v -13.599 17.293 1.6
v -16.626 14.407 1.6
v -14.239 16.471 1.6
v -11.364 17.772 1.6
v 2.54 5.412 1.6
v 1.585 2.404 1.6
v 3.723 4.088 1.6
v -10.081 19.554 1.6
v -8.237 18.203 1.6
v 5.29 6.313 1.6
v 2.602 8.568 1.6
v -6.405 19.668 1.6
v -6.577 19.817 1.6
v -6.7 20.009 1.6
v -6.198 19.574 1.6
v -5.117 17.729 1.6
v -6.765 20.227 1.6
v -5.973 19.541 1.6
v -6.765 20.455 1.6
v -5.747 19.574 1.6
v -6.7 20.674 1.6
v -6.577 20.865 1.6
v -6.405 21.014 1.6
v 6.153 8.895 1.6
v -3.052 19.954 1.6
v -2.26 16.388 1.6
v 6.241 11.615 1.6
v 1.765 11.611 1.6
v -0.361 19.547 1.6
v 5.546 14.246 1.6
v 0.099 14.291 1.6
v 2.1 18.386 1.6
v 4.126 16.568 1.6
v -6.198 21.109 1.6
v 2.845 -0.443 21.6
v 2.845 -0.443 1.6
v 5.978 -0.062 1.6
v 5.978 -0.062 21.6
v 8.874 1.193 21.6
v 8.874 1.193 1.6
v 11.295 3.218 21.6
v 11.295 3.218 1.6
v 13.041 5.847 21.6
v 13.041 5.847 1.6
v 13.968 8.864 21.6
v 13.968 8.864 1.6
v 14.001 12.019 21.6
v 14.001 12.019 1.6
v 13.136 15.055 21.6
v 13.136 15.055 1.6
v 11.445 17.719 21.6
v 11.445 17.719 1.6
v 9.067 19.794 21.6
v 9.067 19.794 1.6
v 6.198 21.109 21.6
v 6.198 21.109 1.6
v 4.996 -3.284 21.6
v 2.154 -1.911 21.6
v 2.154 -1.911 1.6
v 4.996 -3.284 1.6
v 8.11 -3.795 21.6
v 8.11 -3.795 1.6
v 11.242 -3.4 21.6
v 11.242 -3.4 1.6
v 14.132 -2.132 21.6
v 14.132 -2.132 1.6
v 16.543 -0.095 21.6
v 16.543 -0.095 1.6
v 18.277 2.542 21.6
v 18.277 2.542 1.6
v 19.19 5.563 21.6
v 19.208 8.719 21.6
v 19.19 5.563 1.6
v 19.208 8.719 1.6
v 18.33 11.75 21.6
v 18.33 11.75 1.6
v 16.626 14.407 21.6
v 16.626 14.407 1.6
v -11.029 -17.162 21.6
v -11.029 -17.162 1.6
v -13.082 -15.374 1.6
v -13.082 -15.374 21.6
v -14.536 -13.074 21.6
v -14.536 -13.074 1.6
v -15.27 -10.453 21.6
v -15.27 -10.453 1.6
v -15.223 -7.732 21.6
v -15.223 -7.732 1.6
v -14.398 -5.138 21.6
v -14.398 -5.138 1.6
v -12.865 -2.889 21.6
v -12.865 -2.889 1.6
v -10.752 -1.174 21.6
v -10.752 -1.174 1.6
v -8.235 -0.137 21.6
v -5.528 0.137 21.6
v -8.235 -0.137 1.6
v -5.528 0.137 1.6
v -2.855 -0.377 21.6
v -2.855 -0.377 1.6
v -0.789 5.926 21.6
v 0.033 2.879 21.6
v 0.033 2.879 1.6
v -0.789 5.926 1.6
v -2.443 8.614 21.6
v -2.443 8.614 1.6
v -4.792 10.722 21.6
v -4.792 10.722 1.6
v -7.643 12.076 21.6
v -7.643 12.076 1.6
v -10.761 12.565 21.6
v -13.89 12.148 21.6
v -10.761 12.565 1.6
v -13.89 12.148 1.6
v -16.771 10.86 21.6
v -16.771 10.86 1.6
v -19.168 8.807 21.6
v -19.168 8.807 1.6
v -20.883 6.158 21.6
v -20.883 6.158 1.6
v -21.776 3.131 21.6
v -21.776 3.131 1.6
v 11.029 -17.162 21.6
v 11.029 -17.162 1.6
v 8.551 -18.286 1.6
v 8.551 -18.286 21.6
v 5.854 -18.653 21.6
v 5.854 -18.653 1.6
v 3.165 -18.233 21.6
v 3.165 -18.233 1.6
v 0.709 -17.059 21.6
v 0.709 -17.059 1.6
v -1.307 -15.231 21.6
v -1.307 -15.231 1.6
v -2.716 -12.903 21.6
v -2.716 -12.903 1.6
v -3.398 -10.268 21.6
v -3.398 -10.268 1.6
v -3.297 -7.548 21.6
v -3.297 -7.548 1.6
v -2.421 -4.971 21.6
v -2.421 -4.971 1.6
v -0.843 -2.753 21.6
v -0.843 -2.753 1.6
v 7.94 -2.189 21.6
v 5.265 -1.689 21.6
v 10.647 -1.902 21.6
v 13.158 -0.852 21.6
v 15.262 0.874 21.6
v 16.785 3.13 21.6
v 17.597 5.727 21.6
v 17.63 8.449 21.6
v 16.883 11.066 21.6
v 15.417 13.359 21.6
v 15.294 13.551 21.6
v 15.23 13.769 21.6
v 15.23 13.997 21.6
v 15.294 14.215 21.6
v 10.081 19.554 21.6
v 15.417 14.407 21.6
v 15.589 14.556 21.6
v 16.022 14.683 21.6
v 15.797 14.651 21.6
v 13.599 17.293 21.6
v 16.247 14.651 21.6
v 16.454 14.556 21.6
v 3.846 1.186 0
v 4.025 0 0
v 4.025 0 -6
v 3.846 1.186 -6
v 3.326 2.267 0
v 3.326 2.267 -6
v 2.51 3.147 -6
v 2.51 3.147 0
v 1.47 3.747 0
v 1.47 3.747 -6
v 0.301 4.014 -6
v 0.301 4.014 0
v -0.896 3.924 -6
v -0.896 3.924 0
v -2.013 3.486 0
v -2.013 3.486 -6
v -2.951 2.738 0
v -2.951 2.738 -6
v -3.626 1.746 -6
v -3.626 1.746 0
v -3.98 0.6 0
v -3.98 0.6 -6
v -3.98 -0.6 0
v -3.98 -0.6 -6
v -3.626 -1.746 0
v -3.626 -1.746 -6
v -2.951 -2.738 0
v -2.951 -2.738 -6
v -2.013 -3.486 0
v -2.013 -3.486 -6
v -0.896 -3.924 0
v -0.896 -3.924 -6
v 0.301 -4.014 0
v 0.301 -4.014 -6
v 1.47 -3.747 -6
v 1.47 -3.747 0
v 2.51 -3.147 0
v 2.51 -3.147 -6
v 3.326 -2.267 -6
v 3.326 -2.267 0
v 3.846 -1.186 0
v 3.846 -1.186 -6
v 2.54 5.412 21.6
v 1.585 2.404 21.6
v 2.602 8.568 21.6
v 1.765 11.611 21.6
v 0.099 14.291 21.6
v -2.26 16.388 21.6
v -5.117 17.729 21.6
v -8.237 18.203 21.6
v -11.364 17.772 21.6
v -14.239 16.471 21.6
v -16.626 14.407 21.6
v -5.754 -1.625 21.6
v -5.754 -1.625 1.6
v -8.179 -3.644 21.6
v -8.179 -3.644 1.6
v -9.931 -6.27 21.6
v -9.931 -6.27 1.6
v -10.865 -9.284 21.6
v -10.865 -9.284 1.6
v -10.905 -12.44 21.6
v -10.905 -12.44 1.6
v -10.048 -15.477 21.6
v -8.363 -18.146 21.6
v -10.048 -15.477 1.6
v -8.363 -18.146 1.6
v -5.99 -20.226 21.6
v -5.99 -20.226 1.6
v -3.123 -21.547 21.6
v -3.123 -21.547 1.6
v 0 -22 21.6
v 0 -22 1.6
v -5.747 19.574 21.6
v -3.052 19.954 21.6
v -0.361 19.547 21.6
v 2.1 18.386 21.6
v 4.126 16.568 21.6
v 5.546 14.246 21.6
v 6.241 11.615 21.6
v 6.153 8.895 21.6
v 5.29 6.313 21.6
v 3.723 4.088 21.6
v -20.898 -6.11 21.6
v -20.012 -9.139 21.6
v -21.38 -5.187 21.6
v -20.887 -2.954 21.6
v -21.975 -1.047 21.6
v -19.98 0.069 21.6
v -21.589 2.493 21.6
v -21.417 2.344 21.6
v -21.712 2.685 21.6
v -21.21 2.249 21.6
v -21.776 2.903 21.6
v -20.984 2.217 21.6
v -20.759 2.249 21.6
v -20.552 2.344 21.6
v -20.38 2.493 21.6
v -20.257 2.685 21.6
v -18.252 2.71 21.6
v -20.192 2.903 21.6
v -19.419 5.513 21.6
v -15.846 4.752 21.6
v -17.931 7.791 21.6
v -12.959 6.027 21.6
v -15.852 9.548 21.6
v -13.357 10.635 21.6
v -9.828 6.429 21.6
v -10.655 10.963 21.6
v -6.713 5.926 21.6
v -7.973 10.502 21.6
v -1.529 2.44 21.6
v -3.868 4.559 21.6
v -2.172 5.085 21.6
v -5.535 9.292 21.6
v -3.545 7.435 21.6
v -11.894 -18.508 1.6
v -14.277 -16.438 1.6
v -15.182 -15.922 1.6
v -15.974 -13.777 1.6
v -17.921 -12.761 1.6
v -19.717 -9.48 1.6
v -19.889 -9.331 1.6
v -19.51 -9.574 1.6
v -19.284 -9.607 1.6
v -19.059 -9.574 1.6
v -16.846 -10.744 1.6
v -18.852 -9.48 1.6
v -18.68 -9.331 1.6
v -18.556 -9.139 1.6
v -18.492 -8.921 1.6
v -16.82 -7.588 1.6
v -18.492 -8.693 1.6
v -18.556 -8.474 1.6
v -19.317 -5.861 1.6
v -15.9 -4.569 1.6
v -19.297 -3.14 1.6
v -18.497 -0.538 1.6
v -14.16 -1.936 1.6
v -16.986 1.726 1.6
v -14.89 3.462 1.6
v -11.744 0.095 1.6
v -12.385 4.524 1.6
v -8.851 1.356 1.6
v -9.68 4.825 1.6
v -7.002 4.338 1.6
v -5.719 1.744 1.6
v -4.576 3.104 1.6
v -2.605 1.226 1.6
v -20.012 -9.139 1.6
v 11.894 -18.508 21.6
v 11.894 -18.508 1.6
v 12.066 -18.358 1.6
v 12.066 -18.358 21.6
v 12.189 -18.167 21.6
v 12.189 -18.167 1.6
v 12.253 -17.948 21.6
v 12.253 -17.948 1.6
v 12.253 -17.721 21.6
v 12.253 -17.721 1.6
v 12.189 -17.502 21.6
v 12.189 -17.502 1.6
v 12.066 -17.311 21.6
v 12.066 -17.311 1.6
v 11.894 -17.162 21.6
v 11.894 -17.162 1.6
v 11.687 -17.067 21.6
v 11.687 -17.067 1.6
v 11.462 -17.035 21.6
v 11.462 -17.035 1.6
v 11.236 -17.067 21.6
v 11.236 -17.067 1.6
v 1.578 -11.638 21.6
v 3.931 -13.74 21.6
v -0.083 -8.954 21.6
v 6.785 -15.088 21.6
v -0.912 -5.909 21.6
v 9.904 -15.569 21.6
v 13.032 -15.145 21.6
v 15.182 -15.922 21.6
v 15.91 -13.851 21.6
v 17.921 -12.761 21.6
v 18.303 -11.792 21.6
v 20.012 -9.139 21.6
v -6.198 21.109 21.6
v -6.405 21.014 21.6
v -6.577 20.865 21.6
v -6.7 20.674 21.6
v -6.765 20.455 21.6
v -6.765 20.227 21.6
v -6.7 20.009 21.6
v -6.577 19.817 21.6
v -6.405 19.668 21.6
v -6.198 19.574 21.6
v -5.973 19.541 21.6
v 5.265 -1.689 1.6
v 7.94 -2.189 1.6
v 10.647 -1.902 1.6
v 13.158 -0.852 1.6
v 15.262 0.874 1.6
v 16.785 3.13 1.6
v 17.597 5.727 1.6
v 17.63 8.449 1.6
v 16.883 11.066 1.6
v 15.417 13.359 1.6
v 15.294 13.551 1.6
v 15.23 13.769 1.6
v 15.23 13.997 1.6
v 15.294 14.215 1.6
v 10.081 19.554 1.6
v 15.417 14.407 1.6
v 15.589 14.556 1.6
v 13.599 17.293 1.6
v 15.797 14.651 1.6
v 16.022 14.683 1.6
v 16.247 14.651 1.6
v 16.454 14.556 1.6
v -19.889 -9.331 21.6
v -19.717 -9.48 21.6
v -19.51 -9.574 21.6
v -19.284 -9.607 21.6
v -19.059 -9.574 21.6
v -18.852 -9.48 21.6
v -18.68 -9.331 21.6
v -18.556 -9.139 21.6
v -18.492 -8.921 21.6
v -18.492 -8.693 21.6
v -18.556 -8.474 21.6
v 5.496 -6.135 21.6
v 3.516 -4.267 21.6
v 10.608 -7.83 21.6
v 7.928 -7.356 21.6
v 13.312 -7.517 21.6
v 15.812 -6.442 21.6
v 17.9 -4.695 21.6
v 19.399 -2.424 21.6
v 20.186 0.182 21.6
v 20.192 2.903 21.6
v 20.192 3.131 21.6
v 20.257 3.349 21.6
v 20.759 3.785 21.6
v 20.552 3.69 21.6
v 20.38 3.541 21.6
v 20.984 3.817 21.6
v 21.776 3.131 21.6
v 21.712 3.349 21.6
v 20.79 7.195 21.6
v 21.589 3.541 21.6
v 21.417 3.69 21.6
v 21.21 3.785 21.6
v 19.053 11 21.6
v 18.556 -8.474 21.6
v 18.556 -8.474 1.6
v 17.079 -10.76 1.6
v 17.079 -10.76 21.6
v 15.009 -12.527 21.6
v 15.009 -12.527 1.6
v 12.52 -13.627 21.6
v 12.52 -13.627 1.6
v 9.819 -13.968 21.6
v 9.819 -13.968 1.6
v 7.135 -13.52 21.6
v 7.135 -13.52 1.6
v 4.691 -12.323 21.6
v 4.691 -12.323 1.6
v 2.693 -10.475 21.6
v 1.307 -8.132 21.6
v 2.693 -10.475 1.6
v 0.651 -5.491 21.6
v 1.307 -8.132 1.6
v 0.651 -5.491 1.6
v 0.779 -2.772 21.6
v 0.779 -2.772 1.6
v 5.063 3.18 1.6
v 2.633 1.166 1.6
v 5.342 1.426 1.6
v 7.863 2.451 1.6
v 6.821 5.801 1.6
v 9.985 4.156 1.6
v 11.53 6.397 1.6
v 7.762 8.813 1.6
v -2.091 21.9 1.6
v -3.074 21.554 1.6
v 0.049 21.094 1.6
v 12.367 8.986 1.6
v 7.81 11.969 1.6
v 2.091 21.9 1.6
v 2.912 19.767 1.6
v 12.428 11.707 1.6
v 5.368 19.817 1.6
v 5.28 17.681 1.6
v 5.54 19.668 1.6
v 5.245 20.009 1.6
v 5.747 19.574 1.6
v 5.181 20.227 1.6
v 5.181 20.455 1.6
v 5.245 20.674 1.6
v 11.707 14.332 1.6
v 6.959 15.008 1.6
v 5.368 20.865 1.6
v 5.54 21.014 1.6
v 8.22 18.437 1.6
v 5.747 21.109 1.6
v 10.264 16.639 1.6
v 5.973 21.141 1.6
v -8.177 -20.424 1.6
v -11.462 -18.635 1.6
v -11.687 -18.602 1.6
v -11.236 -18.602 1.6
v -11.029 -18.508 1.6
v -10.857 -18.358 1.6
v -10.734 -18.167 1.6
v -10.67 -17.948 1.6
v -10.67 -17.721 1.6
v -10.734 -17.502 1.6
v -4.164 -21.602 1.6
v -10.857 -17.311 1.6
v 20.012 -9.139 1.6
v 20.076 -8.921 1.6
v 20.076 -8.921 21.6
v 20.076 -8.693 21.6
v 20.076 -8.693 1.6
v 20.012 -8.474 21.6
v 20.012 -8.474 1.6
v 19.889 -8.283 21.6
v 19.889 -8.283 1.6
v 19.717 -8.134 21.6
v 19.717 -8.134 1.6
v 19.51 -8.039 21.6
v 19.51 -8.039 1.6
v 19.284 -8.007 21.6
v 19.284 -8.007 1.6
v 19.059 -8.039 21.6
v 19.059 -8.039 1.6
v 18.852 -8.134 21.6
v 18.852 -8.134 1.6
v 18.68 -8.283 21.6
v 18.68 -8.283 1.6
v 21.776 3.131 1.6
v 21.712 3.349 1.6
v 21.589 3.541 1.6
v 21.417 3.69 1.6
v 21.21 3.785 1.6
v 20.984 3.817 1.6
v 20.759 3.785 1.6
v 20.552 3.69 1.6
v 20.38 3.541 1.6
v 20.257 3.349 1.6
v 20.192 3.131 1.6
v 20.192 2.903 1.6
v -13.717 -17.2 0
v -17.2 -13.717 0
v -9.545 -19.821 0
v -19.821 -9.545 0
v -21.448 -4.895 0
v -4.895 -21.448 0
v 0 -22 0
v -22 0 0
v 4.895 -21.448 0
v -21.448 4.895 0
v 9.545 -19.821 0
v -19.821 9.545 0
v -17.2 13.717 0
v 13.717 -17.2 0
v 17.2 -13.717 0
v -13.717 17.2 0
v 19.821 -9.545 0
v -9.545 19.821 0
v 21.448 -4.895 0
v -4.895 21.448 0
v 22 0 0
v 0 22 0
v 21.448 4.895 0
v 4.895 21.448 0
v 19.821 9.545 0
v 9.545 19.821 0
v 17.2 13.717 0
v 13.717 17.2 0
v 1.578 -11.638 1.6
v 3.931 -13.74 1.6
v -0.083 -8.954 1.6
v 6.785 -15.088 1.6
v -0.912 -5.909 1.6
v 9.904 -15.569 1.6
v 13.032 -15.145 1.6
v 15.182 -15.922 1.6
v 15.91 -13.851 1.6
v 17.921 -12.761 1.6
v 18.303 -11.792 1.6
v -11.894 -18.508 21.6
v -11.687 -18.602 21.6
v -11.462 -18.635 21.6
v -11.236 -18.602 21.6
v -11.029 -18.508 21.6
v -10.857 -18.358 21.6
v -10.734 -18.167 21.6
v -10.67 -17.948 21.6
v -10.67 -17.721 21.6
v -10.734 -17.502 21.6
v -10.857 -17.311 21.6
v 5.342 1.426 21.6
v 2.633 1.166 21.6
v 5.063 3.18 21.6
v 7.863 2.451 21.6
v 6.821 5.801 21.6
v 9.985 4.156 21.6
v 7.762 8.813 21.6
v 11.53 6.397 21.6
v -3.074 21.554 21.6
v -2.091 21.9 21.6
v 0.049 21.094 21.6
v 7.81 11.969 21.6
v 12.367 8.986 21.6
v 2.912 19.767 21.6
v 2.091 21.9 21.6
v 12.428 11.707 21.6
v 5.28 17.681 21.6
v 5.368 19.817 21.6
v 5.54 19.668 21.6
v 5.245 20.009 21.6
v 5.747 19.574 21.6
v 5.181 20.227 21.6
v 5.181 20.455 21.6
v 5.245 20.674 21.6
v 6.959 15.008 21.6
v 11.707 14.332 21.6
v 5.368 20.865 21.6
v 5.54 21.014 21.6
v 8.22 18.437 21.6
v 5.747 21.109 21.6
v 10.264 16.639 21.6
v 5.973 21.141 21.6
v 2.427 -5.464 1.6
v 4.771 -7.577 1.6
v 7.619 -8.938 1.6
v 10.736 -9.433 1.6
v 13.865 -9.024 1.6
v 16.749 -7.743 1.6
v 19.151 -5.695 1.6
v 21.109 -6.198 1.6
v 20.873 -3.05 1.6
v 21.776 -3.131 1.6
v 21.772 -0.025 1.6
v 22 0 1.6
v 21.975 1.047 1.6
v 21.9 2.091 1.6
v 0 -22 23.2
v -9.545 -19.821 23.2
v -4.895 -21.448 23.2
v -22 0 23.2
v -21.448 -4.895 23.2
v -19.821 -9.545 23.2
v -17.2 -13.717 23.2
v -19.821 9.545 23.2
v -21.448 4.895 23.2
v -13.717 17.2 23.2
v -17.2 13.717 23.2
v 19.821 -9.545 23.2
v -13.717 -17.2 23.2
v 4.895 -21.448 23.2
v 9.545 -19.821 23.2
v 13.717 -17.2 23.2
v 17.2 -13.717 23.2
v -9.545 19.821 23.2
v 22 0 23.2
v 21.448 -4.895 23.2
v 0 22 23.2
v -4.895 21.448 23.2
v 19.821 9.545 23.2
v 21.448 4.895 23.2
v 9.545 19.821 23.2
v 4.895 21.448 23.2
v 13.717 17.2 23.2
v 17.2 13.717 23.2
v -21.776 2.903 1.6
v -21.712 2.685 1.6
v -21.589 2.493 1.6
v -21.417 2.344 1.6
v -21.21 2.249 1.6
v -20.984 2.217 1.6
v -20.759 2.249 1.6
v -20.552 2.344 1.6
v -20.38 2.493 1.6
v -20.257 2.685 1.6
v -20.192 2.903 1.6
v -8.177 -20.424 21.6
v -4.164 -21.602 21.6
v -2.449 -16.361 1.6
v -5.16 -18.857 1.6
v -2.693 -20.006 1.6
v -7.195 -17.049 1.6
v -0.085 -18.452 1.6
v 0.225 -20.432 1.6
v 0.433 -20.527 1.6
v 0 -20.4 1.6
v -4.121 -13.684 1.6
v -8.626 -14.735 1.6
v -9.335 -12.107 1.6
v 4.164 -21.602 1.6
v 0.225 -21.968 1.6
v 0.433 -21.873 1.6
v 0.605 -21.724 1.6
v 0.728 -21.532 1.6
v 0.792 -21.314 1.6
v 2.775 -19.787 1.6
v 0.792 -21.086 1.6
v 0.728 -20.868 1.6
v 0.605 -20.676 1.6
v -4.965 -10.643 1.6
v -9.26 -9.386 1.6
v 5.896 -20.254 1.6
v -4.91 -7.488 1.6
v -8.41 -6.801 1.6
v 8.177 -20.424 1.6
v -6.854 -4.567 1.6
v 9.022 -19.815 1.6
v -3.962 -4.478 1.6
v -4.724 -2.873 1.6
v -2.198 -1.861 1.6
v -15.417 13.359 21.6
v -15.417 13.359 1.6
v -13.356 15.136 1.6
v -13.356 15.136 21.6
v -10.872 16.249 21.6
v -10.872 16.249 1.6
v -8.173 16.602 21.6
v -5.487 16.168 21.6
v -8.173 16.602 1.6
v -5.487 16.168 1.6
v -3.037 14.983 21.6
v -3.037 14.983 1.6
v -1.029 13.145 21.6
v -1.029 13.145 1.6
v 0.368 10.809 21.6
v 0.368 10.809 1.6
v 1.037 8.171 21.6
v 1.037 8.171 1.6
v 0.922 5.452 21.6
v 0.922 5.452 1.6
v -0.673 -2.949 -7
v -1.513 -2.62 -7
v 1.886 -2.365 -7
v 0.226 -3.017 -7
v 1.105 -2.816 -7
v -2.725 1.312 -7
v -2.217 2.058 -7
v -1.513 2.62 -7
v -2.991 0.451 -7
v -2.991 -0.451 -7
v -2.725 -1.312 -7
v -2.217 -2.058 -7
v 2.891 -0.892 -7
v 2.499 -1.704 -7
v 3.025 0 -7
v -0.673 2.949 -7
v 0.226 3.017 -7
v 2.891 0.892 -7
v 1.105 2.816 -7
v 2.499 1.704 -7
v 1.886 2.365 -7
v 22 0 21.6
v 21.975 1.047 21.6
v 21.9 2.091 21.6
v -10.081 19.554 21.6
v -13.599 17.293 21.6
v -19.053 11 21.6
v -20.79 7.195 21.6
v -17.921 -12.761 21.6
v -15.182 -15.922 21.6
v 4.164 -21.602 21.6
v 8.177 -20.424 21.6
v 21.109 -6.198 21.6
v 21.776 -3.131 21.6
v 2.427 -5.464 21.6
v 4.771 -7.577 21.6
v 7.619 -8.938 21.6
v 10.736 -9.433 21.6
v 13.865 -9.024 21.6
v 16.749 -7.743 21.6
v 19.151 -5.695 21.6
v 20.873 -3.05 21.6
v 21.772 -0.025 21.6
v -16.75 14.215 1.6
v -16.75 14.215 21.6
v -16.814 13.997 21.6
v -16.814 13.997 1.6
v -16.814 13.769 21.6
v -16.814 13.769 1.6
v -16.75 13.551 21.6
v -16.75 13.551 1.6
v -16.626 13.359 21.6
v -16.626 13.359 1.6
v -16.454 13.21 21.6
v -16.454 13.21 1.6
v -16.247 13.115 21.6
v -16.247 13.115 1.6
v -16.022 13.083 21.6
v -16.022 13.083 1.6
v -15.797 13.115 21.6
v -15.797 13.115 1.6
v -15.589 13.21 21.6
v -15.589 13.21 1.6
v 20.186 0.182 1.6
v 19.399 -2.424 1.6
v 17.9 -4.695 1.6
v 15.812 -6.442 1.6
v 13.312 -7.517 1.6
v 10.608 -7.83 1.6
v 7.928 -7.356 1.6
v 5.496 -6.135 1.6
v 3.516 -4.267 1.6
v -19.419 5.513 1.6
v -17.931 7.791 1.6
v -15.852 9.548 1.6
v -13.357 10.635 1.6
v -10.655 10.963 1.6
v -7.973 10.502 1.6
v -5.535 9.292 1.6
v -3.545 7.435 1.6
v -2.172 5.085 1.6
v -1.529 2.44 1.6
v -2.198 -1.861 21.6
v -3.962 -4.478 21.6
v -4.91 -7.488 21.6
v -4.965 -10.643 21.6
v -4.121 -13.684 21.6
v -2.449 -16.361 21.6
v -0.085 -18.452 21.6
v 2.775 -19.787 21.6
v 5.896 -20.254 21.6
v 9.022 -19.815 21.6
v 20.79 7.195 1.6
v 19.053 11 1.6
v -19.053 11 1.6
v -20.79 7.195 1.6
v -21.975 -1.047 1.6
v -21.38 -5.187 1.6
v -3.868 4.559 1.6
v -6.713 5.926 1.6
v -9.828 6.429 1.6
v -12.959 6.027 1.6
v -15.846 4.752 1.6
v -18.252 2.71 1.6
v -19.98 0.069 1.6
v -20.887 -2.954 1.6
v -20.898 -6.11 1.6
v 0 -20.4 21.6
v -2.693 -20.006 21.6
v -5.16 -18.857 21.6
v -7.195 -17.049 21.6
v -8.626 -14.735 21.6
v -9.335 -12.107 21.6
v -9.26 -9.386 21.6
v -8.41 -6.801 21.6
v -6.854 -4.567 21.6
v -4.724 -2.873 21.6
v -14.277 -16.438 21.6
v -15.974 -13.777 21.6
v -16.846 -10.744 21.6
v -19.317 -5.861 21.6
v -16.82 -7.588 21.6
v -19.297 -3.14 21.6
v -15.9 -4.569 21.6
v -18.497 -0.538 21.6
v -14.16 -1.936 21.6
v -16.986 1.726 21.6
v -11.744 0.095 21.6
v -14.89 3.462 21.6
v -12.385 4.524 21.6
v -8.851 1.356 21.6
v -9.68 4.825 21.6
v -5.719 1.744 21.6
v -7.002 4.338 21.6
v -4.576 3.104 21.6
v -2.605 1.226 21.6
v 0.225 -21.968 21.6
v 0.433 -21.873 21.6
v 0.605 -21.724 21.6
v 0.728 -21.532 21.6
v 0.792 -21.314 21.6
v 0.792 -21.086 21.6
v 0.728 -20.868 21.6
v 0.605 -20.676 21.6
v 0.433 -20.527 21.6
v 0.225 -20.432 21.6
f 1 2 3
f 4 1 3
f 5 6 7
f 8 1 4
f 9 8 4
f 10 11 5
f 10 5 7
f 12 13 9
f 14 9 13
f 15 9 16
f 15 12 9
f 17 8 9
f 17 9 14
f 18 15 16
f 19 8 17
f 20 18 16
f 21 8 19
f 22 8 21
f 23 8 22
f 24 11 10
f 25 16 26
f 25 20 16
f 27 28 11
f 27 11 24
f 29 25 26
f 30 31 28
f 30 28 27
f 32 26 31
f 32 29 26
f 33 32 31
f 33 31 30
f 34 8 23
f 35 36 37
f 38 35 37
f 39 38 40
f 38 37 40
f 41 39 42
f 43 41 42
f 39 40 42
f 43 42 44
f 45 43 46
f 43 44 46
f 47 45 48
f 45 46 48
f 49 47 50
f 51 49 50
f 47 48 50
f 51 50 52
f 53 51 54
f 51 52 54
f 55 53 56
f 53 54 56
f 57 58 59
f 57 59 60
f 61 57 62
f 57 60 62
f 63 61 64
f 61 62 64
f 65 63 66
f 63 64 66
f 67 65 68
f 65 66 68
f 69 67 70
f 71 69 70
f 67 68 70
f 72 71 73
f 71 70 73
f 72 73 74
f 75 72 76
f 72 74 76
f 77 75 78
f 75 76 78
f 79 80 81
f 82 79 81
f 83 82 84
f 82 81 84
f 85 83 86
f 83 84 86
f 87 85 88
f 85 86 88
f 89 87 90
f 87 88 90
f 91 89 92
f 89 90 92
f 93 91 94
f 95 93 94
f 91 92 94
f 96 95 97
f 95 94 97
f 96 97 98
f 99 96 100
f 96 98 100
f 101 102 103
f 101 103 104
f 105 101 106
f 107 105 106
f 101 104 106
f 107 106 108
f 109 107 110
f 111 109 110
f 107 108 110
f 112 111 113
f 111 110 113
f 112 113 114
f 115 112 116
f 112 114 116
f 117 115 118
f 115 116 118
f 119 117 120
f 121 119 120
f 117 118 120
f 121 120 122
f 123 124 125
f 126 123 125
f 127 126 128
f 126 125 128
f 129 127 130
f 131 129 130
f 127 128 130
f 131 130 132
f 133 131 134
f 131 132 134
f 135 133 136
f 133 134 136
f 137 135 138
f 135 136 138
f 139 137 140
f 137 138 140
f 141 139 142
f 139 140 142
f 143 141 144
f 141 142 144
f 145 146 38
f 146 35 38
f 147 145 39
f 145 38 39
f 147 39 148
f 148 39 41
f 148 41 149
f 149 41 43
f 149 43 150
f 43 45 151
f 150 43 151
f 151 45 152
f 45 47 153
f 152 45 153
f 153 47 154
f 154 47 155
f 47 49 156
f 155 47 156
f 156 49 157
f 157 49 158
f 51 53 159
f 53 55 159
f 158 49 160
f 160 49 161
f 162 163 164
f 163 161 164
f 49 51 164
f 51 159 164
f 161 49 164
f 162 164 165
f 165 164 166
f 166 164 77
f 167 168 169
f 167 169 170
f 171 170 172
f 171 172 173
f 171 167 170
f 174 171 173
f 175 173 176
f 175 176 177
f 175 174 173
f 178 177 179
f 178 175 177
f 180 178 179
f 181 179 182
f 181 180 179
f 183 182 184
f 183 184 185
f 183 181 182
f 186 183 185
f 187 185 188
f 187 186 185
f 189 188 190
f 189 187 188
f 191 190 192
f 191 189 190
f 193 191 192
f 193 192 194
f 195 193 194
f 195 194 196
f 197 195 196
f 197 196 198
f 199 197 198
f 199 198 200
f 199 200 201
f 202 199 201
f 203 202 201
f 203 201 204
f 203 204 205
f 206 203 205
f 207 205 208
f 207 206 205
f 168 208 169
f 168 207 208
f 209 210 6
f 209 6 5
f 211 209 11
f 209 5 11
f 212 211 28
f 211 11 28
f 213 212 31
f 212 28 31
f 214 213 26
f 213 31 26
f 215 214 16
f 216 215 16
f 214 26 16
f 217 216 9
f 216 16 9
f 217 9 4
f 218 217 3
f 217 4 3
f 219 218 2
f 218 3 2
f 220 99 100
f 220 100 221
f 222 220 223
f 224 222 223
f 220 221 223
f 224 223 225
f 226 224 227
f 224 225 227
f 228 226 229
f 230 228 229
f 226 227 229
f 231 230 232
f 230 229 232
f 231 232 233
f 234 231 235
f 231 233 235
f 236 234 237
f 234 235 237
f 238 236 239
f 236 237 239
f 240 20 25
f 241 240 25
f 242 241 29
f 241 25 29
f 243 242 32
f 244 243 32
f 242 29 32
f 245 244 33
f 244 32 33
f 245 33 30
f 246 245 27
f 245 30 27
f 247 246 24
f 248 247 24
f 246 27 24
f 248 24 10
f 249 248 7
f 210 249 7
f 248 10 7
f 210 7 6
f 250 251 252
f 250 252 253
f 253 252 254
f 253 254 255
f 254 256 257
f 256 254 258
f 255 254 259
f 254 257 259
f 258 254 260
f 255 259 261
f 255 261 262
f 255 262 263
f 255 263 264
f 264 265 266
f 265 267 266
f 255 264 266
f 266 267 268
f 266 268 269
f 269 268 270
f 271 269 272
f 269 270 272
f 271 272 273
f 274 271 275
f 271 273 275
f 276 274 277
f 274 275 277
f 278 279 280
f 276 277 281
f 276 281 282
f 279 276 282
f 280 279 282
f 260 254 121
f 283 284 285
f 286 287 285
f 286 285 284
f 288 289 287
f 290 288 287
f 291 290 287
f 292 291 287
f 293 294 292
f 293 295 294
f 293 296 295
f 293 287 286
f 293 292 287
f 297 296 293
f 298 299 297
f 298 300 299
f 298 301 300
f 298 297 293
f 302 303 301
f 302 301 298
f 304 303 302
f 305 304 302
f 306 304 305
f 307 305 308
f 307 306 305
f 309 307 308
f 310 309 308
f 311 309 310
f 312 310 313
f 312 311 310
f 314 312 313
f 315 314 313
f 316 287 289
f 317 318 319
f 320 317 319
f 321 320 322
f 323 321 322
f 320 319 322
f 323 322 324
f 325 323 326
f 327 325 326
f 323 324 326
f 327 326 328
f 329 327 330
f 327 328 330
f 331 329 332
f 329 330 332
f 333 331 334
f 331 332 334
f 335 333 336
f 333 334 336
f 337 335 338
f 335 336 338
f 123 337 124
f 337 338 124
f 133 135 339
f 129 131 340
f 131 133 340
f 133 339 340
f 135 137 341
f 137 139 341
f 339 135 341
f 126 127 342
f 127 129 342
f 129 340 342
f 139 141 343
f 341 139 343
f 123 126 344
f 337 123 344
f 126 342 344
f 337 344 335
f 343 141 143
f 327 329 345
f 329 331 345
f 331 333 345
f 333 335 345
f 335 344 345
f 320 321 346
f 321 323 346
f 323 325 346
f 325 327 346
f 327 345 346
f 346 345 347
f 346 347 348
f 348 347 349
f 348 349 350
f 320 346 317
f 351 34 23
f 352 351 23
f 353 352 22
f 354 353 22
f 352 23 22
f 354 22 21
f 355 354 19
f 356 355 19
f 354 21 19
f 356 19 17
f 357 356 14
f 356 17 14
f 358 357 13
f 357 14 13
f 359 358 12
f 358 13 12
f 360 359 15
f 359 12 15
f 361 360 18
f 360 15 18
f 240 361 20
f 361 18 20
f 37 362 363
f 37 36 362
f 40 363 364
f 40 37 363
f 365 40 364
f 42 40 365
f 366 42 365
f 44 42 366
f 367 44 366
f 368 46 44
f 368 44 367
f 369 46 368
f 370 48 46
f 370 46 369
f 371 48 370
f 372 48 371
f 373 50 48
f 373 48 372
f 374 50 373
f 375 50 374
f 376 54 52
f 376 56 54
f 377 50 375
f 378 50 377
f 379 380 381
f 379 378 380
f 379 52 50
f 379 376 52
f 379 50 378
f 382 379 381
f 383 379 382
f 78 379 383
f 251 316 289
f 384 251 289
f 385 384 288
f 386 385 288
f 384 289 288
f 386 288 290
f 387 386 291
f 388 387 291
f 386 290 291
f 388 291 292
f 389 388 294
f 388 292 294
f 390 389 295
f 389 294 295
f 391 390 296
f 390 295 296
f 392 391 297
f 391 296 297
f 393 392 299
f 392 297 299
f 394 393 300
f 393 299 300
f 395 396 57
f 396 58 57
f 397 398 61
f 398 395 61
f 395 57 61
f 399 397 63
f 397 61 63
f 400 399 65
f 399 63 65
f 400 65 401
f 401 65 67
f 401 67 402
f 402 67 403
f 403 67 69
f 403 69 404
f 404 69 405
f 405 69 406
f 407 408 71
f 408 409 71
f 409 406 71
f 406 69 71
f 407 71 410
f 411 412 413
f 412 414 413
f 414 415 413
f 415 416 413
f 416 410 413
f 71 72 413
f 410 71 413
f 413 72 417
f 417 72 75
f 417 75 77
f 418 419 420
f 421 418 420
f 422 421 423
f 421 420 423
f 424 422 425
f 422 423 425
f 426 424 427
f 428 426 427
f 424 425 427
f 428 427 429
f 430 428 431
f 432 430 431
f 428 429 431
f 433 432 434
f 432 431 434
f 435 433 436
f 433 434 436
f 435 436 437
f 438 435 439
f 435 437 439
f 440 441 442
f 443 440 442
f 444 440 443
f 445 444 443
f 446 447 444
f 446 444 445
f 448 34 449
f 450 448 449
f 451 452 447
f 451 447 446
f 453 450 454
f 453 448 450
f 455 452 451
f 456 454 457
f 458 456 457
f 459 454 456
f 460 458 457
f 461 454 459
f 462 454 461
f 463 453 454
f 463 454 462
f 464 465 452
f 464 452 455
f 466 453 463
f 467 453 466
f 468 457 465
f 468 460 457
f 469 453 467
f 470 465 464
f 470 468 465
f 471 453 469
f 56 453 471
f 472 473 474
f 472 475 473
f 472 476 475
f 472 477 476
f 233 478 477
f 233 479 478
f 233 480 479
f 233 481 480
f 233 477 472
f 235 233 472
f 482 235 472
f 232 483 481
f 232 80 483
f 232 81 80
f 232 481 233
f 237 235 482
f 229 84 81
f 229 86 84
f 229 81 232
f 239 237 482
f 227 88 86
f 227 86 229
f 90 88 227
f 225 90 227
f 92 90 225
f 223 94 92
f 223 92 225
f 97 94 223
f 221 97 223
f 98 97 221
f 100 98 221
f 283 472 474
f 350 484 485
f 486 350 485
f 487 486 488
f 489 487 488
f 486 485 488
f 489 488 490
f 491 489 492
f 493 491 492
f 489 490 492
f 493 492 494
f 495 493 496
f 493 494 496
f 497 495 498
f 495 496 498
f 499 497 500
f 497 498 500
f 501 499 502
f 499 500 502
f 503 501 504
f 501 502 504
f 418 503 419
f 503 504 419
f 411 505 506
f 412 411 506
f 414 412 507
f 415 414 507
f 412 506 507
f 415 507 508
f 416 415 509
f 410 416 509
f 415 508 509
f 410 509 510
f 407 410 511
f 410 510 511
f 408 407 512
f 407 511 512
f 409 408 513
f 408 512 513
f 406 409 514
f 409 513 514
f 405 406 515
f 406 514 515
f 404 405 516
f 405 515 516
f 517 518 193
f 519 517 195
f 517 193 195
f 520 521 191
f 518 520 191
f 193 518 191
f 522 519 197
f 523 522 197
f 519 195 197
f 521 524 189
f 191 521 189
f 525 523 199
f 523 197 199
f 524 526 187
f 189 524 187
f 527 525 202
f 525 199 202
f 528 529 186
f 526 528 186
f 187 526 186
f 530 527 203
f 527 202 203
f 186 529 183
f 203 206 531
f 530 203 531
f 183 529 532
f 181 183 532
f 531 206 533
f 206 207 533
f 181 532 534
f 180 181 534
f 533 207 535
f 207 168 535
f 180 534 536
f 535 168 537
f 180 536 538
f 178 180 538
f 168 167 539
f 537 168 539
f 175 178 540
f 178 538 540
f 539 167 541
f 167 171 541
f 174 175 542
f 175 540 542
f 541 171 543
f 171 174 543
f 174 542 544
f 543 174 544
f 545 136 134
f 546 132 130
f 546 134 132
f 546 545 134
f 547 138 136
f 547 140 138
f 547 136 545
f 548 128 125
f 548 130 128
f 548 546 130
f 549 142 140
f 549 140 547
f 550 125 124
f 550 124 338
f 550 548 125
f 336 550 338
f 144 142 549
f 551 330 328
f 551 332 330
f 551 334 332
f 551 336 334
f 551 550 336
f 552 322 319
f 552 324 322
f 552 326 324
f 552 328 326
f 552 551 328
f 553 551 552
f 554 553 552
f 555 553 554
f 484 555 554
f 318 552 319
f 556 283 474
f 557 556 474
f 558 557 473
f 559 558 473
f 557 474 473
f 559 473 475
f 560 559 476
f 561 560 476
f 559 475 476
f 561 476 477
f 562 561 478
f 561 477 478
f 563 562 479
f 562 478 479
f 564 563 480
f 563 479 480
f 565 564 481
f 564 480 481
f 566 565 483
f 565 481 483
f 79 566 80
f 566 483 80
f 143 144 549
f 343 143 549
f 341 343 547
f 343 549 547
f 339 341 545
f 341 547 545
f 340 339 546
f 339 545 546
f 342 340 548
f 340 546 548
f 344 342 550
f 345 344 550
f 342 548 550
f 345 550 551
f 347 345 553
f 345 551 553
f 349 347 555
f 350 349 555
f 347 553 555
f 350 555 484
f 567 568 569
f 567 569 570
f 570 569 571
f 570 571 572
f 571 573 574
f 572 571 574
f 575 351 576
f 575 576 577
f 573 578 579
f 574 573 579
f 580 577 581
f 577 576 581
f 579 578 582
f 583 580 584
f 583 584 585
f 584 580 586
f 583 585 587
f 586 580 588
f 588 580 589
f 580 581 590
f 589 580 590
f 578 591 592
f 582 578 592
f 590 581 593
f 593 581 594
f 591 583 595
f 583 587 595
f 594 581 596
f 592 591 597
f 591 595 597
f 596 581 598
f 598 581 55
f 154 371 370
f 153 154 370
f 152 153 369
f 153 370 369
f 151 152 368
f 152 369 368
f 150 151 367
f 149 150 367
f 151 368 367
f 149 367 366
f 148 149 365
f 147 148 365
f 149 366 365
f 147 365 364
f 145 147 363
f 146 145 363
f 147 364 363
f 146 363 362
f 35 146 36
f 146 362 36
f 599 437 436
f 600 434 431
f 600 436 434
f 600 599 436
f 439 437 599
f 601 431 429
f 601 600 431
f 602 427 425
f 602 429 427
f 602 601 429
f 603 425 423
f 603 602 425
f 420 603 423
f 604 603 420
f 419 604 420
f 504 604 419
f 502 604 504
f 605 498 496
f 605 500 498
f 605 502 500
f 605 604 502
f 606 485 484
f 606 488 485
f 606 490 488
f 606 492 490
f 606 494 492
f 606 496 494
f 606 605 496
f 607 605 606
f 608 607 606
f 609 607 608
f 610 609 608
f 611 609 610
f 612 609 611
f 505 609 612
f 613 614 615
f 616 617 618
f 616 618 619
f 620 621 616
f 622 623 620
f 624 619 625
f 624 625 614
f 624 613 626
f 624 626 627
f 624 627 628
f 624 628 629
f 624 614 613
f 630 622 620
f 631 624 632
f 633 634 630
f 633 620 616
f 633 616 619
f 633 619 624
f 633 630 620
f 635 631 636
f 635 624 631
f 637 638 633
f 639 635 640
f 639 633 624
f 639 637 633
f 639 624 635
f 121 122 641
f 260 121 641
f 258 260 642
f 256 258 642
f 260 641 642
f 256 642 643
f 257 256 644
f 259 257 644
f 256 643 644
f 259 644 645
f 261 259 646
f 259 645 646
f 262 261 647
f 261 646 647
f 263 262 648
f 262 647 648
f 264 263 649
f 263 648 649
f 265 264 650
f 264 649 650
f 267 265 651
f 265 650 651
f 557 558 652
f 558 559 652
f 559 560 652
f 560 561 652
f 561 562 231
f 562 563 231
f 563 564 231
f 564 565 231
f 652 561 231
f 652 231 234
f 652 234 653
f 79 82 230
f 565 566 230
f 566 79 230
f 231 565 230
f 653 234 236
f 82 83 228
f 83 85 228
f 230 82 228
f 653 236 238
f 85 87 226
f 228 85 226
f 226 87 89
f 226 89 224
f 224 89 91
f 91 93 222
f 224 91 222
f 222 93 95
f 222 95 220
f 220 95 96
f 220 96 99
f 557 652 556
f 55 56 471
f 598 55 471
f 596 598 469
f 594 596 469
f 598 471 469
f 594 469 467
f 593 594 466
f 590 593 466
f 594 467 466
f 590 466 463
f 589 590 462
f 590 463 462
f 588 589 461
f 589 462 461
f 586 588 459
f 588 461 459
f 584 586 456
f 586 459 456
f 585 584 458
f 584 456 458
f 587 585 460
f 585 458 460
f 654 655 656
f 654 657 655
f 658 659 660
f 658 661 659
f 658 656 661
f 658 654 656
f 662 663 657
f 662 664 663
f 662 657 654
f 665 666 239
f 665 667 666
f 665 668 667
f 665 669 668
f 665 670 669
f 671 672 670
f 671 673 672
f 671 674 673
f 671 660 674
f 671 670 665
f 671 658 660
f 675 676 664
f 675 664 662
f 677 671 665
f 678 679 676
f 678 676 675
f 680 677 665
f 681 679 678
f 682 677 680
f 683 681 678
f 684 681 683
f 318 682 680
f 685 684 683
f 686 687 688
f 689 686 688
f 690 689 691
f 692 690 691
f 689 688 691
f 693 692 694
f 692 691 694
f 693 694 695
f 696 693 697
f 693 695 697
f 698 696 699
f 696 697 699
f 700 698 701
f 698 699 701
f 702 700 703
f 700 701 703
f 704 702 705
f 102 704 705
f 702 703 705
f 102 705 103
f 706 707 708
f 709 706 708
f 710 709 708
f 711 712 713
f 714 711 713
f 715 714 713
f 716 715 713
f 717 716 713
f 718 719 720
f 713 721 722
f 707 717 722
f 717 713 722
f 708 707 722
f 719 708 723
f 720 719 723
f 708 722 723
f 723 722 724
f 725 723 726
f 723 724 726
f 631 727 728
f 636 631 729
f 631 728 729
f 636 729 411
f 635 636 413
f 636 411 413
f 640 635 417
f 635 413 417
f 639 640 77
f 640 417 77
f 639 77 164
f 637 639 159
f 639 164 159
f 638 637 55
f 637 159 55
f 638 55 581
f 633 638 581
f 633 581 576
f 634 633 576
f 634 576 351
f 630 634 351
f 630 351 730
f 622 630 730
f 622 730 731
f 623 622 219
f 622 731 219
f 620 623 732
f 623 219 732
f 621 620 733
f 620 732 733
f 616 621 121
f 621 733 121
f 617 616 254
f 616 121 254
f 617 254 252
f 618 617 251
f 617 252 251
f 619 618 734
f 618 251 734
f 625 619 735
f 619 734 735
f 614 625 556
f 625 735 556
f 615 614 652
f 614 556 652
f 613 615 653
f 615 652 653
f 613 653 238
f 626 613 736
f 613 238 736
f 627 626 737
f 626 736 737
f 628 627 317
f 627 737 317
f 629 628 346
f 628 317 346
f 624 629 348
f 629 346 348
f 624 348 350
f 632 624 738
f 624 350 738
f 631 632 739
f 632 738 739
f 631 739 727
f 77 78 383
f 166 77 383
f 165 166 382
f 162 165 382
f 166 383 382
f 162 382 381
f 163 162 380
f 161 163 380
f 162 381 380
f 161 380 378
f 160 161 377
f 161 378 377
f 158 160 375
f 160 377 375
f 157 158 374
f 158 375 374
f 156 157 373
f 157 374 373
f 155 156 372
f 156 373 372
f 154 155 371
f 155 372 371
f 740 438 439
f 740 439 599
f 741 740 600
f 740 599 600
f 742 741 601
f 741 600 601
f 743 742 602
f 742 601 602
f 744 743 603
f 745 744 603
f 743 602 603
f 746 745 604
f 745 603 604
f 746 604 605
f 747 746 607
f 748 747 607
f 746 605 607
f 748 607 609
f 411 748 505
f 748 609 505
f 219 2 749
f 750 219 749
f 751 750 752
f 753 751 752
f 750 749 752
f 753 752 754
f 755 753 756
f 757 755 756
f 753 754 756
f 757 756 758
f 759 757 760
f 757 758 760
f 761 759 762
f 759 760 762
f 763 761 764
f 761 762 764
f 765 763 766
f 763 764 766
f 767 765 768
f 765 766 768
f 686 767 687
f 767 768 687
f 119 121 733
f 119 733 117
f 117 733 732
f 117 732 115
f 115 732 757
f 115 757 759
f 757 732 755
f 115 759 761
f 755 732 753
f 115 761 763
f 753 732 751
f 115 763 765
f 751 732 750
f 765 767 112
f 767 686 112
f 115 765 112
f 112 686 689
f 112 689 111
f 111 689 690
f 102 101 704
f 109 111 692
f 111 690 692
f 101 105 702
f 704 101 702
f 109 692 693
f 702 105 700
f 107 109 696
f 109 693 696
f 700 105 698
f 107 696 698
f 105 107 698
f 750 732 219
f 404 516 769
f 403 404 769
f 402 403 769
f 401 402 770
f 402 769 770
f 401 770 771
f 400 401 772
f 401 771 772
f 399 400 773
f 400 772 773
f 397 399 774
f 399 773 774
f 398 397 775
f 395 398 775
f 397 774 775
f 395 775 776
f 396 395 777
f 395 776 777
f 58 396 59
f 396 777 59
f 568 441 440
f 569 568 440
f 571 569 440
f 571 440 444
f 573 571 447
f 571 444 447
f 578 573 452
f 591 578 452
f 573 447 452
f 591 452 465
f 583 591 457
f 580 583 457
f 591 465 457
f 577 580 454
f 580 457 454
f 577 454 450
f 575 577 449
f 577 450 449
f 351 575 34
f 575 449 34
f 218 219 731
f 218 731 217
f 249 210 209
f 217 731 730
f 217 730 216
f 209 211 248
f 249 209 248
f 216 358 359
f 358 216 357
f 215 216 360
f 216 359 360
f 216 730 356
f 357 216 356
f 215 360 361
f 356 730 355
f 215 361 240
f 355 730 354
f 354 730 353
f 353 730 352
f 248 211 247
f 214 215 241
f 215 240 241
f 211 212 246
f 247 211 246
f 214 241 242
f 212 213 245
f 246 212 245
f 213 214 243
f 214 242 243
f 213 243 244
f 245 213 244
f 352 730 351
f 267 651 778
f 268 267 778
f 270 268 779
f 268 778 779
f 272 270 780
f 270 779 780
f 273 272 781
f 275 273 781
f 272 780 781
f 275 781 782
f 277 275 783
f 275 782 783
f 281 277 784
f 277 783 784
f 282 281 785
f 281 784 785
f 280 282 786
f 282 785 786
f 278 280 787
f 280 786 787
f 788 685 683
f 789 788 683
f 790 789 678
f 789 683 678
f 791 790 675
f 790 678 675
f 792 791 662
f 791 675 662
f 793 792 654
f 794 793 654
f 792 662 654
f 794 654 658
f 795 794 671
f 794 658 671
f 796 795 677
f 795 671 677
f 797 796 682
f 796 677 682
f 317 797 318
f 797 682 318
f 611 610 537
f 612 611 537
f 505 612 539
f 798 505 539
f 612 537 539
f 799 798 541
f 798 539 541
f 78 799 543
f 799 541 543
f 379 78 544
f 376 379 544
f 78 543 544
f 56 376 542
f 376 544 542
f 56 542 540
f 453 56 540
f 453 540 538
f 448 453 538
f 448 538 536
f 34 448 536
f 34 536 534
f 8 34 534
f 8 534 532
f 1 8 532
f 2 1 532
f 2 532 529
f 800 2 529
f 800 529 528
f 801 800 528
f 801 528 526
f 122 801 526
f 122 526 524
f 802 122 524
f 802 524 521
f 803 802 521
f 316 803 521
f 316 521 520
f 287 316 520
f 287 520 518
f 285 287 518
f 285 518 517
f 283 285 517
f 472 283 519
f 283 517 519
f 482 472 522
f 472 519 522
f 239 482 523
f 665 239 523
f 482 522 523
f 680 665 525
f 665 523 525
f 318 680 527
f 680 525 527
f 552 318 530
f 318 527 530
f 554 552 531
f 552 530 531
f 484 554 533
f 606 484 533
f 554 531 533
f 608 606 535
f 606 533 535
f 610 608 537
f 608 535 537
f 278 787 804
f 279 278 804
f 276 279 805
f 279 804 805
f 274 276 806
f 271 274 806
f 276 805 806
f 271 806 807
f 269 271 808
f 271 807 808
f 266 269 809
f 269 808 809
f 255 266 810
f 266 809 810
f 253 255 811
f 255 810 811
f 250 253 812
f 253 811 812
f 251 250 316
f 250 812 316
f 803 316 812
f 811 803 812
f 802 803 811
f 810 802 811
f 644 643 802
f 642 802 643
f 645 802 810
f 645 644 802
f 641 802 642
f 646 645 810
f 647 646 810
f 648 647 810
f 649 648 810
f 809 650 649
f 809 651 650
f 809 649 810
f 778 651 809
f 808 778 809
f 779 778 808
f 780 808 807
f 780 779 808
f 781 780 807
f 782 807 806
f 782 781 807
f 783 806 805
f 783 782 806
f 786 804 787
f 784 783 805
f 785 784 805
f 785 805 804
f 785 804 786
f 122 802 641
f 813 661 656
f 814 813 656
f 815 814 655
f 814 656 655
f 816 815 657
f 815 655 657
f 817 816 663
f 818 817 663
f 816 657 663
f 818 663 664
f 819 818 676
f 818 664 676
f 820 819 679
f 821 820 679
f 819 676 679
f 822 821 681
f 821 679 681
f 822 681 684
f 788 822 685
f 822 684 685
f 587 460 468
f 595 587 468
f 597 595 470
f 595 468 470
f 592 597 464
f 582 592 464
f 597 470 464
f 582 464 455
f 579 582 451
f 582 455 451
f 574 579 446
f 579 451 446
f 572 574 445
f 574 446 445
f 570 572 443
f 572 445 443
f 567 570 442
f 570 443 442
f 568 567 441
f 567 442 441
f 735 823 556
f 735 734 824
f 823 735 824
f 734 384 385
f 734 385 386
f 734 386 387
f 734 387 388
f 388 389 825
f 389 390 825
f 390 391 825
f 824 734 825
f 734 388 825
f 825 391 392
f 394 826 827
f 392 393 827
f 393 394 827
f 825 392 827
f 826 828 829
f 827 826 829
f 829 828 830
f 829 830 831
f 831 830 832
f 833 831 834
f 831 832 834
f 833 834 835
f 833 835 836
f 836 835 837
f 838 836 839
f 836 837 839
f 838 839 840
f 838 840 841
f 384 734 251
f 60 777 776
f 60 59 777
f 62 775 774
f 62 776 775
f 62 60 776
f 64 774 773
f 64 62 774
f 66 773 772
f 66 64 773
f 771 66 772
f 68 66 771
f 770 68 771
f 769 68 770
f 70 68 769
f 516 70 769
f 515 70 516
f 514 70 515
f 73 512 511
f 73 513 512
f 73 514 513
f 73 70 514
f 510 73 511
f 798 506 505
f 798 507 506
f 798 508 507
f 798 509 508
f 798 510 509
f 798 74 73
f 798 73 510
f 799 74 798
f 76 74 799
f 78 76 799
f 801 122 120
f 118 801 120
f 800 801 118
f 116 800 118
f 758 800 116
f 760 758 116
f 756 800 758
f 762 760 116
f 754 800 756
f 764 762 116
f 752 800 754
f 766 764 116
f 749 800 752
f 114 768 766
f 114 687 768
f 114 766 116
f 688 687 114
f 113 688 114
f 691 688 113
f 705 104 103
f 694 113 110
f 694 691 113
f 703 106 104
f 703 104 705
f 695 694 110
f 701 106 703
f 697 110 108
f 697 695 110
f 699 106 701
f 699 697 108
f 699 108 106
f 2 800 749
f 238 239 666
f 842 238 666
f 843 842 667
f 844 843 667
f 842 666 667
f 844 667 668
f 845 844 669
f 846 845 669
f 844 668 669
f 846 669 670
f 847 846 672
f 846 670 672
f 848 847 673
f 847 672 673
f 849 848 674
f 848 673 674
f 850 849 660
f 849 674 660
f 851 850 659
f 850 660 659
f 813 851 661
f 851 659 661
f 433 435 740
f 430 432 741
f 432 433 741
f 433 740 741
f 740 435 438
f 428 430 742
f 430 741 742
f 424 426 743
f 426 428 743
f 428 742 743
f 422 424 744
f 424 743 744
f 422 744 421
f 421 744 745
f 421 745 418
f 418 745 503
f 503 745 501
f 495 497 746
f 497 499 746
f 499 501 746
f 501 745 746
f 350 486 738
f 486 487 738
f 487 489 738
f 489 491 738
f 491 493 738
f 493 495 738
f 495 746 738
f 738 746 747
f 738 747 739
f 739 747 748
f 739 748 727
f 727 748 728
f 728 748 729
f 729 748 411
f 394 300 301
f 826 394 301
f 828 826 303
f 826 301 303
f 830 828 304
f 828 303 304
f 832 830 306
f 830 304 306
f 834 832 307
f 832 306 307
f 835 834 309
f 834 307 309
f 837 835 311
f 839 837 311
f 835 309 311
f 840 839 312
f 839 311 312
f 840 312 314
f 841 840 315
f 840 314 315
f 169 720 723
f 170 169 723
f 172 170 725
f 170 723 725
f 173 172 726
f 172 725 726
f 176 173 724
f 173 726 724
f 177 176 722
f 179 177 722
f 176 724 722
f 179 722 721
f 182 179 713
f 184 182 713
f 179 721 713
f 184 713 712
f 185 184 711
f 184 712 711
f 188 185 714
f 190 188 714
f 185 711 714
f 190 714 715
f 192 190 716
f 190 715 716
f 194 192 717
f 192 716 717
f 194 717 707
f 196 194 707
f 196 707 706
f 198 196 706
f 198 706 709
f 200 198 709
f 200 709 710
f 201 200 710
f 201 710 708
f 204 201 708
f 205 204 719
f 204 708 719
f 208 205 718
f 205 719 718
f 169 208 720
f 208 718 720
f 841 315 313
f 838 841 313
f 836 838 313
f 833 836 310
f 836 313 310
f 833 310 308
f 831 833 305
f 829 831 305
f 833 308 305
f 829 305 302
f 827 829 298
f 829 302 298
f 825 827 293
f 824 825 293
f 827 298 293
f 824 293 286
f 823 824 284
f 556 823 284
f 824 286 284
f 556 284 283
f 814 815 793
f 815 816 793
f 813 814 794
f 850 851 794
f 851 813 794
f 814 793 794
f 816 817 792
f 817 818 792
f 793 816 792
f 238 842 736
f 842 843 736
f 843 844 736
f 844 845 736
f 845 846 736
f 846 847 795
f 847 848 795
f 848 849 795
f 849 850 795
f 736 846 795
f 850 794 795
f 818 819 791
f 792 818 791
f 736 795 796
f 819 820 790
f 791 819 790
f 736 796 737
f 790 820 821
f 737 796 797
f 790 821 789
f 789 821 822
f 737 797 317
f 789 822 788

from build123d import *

# Parameters (mm, degrees)
F4_R      = 22
F4_R_2    = 4.025
F5_DEPTH  = 1.6
F6_DEPTH  = 7
F8_SIZE   = 1
F9_DEPTH  = 20
F10_COUNT = 11
F11_START = 21.6
F11_DEPTH = 1.6


with BuildPart() as f5:
    # F4 (on Top) → F5 (new body)
    with BuildSketch(Plane.XY):
        Circle(F4_R)
        Circle(F4_R_2, mode=Mode.SUBTRACT)
        Circle(F4_R_2)
    extrude(amount=F5_DEPTH)

    # F4 (on Top) → F6 (join)
    with BuildSketch(Plane.XY):
        Circle(F4_R_2)
    extrude(amount=-F6_DEPTH)

    # F8
    f8_edges = [f5.edges().sort_by_distance(p)[0] for p in [
        (-4.025, 0, -7),
    ]]
    chamfer(f8_edges, length=F8_SIZE)



with BuildPart() as f9:
    # F7 (on face) → F9 (new body)
    with BuildSketch(Plane.XY.offset(1.6)):
        with BuildLine():
            ThreePointArc((0, -1.6), (0.8, -0.8), (0, 0))
            ThreePointArc((0, 0), (-11, -11), (0, -22))
            ThreePointArc((0, -22), (0.8, -21.2), (0, -20.4))
            ThreePointArc((0, -20.4), (-9.4, -11), (0, -1.6))
        make_face()
    extrude(amount=F9_DEPTH)


with BuildPart() as f5_1:
    add(f5.part)

    add(f9.part)  # F10 merges F9
    # F10: F9 ×11 about axis
    f10_axis = Axis((0, 0, 0), (0, 0, 1))
    for i in range(1, F10_COUNT):
        add(f9.part.rotate(f10_axis, i * 360 / F10_COUNT))

    # F4 (on Top) → F11 (join)
    with BuildSketch(Plane.XY.offset(F11_START)):
        Circle(F4_R)
        Circle(F4_R_2, mode=Mode.SUBTRACT)
        Circle(F4_R_2)
    extrude(amount=F11_DEPTH)


solid = f5_1.part
